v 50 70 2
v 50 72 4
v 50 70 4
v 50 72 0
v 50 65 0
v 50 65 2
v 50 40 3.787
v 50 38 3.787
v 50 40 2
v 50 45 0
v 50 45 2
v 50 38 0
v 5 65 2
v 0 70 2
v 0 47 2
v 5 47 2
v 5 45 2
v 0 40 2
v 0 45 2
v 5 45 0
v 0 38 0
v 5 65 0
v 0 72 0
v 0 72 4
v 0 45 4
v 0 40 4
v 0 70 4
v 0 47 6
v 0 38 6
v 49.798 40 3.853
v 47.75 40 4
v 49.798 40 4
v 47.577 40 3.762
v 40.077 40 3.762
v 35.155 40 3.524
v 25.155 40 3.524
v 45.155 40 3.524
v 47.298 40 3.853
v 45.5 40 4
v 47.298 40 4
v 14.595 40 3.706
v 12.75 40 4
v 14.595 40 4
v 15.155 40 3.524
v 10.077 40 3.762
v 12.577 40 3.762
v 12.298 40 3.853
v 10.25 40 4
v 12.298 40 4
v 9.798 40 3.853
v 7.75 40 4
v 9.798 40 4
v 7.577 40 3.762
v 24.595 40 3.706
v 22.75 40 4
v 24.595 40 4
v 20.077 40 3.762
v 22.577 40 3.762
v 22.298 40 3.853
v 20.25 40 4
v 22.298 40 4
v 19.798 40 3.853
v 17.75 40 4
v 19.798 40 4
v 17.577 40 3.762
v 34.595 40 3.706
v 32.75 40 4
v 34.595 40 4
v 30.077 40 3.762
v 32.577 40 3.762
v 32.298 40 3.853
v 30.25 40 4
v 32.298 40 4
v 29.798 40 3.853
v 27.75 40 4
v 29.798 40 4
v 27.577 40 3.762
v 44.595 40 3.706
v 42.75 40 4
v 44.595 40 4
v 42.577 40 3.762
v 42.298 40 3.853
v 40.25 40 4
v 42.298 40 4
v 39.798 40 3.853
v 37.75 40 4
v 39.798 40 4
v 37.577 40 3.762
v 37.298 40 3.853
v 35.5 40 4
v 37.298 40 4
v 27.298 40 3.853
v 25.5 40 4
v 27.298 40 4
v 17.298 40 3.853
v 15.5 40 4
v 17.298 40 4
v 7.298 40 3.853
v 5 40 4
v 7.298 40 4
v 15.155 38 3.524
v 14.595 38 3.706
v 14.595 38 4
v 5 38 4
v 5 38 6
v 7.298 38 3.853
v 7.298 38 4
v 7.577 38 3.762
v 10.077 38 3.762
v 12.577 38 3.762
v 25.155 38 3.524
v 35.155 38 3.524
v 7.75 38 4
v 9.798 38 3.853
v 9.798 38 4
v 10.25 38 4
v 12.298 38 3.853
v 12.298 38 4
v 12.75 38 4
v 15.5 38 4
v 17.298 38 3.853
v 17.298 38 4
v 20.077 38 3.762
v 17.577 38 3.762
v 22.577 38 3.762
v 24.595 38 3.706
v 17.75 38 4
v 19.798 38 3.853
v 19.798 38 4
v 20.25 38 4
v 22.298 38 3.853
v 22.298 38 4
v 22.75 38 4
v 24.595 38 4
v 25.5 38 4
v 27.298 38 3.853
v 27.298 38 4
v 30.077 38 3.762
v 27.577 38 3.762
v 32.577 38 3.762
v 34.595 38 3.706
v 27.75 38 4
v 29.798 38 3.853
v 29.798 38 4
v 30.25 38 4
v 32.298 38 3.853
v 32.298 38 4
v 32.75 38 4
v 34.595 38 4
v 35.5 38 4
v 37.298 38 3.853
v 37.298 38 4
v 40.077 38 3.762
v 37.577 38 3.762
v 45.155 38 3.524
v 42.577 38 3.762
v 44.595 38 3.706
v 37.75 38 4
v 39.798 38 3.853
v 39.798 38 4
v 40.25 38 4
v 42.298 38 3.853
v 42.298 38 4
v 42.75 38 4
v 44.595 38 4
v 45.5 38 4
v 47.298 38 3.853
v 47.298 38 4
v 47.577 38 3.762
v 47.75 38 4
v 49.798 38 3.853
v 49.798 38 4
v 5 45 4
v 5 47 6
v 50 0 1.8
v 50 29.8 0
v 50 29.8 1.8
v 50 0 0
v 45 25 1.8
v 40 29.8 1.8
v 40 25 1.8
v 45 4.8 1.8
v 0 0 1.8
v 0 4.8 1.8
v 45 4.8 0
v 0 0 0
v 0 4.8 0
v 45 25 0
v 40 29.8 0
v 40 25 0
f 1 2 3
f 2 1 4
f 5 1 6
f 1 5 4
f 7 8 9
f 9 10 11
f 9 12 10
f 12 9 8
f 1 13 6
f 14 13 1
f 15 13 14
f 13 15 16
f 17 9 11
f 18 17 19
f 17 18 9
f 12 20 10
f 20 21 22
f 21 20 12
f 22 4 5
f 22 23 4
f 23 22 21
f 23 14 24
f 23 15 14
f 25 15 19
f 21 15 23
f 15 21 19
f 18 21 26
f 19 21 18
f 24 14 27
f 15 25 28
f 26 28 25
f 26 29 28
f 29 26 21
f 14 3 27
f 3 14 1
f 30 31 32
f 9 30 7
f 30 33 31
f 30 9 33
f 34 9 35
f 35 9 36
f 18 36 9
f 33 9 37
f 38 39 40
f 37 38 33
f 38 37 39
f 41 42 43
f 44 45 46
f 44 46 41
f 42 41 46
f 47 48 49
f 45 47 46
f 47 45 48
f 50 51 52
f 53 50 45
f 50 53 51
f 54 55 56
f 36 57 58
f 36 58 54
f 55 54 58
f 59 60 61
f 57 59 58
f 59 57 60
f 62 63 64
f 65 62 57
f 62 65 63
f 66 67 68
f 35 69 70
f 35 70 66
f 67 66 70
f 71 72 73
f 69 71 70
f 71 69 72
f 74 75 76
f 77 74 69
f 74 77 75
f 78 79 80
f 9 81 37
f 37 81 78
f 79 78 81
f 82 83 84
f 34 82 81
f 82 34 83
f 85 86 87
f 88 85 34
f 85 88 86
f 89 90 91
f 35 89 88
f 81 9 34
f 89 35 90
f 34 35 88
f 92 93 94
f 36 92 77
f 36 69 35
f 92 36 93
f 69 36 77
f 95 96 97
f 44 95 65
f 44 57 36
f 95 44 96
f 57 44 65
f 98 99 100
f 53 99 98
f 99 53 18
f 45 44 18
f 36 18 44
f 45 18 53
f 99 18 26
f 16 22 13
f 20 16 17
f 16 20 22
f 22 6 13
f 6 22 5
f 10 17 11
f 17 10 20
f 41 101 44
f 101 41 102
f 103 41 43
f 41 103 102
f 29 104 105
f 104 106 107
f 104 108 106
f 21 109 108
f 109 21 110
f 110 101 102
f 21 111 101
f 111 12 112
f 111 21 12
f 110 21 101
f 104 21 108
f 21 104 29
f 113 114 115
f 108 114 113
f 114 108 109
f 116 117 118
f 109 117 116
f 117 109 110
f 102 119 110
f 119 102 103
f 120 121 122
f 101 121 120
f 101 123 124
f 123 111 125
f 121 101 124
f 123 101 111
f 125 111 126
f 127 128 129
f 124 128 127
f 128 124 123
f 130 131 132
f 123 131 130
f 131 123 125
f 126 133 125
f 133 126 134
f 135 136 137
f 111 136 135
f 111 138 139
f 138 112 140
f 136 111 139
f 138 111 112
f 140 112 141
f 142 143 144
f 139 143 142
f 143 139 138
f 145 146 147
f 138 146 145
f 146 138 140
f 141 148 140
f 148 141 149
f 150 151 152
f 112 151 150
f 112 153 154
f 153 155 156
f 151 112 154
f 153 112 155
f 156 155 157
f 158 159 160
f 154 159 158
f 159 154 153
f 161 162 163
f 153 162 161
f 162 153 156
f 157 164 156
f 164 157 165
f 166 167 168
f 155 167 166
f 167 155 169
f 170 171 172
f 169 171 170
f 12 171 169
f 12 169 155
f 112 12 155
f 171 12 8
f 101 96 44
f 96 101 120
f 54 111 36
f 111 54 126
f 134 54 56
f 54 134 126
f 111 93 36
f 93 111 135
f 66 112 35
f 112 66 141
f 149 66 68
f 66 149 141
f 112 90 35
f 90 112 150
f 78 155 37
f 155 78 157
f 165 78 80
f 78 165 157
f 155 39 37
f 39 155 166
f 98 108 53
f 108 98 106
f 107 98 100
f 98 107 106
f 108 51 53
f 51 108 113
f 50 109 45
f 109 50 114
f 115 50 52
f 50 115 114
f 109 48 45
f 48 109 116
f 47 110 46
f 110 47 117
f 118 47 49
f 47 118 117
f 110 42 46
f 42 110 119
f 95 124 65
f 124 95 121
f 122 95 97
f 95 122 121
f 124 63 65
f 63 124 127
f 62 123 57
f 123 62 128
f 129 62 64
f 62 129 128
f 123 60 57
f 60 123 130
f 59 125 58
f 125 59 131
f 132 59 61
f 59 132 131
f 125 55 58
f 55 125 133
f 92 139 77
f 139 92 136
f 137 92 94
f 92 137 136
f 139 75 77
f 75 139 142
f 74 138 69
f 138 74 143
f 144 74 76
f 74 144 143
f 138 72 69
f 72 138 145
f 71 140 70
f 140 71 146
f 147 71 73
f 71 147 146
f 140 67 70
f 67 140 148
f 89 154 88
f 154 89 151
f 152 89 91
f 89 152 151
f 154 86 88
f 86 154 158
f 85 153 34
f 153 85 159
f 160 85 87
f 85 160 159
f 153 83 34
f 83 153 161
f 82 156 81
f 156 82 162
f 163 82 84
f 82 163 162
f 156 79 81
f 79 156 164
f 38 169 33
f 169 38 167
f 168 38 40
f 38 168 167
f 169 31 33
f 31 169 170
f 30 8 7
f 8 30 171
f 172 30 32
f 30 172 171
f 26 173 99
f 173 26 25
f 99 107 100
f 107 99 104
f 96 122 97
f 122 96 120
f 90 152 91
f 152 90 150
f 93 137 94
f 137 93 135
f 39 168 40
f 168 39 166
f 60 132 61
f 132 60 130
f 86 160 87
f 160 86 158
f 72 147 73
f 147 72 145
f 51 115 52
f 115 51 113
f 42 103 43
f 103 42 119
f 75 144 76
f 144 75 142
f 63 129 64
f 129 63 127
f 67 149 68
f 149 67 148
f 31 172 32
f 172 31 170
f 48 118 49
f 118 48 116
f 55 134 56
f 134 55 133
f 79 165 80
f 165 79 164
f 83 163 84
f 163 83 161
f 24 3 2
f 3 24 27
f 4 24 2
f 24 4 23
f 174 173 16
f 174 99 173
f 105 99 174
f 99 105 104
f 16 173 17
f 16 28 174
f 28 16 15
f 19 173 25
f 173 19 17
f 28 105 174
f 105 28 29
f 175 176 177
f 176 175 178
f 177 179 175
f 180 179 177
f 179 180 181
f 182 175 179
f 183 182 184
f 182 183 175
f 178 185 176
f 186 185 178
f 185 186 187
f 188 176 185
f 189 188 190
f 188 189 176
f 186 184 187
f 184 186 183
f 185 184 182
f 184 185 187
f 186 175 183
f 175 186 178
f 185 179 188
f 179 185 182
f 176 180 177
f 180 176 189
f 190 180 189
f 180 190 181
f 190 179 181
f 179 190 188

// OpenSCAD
module spaghetti_U(
    length,
    hole_width,
    border_width,
    thickness, 
    cut_offsets,
    cut_depths
){
    width = hole_width + 2*border_width;
    // U shape
    difference(){
        cube([length, width, thickness]);
        translate([border_width, border_width, 0])
            cube([length, hole_width, thickness]);
    }
    // walls
    // right wall
    translate([0,-thickness,0])
        difference(){
            cube([length, thickness, 2*thickness]);
            //cuts
            for(cut = [0:len(cut_offsets)-1])
            for(i=[(border_width/cut_offsets[cut])+1: length/cut_offsets[cut]])
                translate([i*cut_offsets[cut], thickness, 2*thickness])
                    rotate([90,0,0])
                        cylinder(thickness, r=cut_depths[cut]);
        }
    // left wall
    translate([0,width,0])
        cube([length, thickness, 2*thickness]);
    // hole
    translate([0, border_width, thickness])
        cube([border_width, thickness, thickness]);
    translate([0,-thickness, 2*thickness])
        cube([border_width, border_width+2*thickness, thickness]);
};

module spaghetti_L(
    length,
    hole_width,
    border_width,
    thickness,
    epsilon
){
    width = hole_width + 2*border_width - epsilon;
    thickness_eps = thickness - epsilon;
    border_width_eps = border_width - epsilon;
    // long leg
    cube([length, border_width_eps, thickness_eps]);
    // top connection
    translate([length-border_width, 0, 0])
        cube([border_width, width, thickness_eps]);
    // short leg
    translate([length-2*border_width, width-border_width_eps, 0])
        cube([border_width, border_width_eps, thickness_eps]);
};

translate([0, 40, 0])
    spaghetti_U(50, 20, 5, 2, [10, 2.5], [0.5,0.25]);
spaghetti_L(50, 20, 5, 2, 0.2);
